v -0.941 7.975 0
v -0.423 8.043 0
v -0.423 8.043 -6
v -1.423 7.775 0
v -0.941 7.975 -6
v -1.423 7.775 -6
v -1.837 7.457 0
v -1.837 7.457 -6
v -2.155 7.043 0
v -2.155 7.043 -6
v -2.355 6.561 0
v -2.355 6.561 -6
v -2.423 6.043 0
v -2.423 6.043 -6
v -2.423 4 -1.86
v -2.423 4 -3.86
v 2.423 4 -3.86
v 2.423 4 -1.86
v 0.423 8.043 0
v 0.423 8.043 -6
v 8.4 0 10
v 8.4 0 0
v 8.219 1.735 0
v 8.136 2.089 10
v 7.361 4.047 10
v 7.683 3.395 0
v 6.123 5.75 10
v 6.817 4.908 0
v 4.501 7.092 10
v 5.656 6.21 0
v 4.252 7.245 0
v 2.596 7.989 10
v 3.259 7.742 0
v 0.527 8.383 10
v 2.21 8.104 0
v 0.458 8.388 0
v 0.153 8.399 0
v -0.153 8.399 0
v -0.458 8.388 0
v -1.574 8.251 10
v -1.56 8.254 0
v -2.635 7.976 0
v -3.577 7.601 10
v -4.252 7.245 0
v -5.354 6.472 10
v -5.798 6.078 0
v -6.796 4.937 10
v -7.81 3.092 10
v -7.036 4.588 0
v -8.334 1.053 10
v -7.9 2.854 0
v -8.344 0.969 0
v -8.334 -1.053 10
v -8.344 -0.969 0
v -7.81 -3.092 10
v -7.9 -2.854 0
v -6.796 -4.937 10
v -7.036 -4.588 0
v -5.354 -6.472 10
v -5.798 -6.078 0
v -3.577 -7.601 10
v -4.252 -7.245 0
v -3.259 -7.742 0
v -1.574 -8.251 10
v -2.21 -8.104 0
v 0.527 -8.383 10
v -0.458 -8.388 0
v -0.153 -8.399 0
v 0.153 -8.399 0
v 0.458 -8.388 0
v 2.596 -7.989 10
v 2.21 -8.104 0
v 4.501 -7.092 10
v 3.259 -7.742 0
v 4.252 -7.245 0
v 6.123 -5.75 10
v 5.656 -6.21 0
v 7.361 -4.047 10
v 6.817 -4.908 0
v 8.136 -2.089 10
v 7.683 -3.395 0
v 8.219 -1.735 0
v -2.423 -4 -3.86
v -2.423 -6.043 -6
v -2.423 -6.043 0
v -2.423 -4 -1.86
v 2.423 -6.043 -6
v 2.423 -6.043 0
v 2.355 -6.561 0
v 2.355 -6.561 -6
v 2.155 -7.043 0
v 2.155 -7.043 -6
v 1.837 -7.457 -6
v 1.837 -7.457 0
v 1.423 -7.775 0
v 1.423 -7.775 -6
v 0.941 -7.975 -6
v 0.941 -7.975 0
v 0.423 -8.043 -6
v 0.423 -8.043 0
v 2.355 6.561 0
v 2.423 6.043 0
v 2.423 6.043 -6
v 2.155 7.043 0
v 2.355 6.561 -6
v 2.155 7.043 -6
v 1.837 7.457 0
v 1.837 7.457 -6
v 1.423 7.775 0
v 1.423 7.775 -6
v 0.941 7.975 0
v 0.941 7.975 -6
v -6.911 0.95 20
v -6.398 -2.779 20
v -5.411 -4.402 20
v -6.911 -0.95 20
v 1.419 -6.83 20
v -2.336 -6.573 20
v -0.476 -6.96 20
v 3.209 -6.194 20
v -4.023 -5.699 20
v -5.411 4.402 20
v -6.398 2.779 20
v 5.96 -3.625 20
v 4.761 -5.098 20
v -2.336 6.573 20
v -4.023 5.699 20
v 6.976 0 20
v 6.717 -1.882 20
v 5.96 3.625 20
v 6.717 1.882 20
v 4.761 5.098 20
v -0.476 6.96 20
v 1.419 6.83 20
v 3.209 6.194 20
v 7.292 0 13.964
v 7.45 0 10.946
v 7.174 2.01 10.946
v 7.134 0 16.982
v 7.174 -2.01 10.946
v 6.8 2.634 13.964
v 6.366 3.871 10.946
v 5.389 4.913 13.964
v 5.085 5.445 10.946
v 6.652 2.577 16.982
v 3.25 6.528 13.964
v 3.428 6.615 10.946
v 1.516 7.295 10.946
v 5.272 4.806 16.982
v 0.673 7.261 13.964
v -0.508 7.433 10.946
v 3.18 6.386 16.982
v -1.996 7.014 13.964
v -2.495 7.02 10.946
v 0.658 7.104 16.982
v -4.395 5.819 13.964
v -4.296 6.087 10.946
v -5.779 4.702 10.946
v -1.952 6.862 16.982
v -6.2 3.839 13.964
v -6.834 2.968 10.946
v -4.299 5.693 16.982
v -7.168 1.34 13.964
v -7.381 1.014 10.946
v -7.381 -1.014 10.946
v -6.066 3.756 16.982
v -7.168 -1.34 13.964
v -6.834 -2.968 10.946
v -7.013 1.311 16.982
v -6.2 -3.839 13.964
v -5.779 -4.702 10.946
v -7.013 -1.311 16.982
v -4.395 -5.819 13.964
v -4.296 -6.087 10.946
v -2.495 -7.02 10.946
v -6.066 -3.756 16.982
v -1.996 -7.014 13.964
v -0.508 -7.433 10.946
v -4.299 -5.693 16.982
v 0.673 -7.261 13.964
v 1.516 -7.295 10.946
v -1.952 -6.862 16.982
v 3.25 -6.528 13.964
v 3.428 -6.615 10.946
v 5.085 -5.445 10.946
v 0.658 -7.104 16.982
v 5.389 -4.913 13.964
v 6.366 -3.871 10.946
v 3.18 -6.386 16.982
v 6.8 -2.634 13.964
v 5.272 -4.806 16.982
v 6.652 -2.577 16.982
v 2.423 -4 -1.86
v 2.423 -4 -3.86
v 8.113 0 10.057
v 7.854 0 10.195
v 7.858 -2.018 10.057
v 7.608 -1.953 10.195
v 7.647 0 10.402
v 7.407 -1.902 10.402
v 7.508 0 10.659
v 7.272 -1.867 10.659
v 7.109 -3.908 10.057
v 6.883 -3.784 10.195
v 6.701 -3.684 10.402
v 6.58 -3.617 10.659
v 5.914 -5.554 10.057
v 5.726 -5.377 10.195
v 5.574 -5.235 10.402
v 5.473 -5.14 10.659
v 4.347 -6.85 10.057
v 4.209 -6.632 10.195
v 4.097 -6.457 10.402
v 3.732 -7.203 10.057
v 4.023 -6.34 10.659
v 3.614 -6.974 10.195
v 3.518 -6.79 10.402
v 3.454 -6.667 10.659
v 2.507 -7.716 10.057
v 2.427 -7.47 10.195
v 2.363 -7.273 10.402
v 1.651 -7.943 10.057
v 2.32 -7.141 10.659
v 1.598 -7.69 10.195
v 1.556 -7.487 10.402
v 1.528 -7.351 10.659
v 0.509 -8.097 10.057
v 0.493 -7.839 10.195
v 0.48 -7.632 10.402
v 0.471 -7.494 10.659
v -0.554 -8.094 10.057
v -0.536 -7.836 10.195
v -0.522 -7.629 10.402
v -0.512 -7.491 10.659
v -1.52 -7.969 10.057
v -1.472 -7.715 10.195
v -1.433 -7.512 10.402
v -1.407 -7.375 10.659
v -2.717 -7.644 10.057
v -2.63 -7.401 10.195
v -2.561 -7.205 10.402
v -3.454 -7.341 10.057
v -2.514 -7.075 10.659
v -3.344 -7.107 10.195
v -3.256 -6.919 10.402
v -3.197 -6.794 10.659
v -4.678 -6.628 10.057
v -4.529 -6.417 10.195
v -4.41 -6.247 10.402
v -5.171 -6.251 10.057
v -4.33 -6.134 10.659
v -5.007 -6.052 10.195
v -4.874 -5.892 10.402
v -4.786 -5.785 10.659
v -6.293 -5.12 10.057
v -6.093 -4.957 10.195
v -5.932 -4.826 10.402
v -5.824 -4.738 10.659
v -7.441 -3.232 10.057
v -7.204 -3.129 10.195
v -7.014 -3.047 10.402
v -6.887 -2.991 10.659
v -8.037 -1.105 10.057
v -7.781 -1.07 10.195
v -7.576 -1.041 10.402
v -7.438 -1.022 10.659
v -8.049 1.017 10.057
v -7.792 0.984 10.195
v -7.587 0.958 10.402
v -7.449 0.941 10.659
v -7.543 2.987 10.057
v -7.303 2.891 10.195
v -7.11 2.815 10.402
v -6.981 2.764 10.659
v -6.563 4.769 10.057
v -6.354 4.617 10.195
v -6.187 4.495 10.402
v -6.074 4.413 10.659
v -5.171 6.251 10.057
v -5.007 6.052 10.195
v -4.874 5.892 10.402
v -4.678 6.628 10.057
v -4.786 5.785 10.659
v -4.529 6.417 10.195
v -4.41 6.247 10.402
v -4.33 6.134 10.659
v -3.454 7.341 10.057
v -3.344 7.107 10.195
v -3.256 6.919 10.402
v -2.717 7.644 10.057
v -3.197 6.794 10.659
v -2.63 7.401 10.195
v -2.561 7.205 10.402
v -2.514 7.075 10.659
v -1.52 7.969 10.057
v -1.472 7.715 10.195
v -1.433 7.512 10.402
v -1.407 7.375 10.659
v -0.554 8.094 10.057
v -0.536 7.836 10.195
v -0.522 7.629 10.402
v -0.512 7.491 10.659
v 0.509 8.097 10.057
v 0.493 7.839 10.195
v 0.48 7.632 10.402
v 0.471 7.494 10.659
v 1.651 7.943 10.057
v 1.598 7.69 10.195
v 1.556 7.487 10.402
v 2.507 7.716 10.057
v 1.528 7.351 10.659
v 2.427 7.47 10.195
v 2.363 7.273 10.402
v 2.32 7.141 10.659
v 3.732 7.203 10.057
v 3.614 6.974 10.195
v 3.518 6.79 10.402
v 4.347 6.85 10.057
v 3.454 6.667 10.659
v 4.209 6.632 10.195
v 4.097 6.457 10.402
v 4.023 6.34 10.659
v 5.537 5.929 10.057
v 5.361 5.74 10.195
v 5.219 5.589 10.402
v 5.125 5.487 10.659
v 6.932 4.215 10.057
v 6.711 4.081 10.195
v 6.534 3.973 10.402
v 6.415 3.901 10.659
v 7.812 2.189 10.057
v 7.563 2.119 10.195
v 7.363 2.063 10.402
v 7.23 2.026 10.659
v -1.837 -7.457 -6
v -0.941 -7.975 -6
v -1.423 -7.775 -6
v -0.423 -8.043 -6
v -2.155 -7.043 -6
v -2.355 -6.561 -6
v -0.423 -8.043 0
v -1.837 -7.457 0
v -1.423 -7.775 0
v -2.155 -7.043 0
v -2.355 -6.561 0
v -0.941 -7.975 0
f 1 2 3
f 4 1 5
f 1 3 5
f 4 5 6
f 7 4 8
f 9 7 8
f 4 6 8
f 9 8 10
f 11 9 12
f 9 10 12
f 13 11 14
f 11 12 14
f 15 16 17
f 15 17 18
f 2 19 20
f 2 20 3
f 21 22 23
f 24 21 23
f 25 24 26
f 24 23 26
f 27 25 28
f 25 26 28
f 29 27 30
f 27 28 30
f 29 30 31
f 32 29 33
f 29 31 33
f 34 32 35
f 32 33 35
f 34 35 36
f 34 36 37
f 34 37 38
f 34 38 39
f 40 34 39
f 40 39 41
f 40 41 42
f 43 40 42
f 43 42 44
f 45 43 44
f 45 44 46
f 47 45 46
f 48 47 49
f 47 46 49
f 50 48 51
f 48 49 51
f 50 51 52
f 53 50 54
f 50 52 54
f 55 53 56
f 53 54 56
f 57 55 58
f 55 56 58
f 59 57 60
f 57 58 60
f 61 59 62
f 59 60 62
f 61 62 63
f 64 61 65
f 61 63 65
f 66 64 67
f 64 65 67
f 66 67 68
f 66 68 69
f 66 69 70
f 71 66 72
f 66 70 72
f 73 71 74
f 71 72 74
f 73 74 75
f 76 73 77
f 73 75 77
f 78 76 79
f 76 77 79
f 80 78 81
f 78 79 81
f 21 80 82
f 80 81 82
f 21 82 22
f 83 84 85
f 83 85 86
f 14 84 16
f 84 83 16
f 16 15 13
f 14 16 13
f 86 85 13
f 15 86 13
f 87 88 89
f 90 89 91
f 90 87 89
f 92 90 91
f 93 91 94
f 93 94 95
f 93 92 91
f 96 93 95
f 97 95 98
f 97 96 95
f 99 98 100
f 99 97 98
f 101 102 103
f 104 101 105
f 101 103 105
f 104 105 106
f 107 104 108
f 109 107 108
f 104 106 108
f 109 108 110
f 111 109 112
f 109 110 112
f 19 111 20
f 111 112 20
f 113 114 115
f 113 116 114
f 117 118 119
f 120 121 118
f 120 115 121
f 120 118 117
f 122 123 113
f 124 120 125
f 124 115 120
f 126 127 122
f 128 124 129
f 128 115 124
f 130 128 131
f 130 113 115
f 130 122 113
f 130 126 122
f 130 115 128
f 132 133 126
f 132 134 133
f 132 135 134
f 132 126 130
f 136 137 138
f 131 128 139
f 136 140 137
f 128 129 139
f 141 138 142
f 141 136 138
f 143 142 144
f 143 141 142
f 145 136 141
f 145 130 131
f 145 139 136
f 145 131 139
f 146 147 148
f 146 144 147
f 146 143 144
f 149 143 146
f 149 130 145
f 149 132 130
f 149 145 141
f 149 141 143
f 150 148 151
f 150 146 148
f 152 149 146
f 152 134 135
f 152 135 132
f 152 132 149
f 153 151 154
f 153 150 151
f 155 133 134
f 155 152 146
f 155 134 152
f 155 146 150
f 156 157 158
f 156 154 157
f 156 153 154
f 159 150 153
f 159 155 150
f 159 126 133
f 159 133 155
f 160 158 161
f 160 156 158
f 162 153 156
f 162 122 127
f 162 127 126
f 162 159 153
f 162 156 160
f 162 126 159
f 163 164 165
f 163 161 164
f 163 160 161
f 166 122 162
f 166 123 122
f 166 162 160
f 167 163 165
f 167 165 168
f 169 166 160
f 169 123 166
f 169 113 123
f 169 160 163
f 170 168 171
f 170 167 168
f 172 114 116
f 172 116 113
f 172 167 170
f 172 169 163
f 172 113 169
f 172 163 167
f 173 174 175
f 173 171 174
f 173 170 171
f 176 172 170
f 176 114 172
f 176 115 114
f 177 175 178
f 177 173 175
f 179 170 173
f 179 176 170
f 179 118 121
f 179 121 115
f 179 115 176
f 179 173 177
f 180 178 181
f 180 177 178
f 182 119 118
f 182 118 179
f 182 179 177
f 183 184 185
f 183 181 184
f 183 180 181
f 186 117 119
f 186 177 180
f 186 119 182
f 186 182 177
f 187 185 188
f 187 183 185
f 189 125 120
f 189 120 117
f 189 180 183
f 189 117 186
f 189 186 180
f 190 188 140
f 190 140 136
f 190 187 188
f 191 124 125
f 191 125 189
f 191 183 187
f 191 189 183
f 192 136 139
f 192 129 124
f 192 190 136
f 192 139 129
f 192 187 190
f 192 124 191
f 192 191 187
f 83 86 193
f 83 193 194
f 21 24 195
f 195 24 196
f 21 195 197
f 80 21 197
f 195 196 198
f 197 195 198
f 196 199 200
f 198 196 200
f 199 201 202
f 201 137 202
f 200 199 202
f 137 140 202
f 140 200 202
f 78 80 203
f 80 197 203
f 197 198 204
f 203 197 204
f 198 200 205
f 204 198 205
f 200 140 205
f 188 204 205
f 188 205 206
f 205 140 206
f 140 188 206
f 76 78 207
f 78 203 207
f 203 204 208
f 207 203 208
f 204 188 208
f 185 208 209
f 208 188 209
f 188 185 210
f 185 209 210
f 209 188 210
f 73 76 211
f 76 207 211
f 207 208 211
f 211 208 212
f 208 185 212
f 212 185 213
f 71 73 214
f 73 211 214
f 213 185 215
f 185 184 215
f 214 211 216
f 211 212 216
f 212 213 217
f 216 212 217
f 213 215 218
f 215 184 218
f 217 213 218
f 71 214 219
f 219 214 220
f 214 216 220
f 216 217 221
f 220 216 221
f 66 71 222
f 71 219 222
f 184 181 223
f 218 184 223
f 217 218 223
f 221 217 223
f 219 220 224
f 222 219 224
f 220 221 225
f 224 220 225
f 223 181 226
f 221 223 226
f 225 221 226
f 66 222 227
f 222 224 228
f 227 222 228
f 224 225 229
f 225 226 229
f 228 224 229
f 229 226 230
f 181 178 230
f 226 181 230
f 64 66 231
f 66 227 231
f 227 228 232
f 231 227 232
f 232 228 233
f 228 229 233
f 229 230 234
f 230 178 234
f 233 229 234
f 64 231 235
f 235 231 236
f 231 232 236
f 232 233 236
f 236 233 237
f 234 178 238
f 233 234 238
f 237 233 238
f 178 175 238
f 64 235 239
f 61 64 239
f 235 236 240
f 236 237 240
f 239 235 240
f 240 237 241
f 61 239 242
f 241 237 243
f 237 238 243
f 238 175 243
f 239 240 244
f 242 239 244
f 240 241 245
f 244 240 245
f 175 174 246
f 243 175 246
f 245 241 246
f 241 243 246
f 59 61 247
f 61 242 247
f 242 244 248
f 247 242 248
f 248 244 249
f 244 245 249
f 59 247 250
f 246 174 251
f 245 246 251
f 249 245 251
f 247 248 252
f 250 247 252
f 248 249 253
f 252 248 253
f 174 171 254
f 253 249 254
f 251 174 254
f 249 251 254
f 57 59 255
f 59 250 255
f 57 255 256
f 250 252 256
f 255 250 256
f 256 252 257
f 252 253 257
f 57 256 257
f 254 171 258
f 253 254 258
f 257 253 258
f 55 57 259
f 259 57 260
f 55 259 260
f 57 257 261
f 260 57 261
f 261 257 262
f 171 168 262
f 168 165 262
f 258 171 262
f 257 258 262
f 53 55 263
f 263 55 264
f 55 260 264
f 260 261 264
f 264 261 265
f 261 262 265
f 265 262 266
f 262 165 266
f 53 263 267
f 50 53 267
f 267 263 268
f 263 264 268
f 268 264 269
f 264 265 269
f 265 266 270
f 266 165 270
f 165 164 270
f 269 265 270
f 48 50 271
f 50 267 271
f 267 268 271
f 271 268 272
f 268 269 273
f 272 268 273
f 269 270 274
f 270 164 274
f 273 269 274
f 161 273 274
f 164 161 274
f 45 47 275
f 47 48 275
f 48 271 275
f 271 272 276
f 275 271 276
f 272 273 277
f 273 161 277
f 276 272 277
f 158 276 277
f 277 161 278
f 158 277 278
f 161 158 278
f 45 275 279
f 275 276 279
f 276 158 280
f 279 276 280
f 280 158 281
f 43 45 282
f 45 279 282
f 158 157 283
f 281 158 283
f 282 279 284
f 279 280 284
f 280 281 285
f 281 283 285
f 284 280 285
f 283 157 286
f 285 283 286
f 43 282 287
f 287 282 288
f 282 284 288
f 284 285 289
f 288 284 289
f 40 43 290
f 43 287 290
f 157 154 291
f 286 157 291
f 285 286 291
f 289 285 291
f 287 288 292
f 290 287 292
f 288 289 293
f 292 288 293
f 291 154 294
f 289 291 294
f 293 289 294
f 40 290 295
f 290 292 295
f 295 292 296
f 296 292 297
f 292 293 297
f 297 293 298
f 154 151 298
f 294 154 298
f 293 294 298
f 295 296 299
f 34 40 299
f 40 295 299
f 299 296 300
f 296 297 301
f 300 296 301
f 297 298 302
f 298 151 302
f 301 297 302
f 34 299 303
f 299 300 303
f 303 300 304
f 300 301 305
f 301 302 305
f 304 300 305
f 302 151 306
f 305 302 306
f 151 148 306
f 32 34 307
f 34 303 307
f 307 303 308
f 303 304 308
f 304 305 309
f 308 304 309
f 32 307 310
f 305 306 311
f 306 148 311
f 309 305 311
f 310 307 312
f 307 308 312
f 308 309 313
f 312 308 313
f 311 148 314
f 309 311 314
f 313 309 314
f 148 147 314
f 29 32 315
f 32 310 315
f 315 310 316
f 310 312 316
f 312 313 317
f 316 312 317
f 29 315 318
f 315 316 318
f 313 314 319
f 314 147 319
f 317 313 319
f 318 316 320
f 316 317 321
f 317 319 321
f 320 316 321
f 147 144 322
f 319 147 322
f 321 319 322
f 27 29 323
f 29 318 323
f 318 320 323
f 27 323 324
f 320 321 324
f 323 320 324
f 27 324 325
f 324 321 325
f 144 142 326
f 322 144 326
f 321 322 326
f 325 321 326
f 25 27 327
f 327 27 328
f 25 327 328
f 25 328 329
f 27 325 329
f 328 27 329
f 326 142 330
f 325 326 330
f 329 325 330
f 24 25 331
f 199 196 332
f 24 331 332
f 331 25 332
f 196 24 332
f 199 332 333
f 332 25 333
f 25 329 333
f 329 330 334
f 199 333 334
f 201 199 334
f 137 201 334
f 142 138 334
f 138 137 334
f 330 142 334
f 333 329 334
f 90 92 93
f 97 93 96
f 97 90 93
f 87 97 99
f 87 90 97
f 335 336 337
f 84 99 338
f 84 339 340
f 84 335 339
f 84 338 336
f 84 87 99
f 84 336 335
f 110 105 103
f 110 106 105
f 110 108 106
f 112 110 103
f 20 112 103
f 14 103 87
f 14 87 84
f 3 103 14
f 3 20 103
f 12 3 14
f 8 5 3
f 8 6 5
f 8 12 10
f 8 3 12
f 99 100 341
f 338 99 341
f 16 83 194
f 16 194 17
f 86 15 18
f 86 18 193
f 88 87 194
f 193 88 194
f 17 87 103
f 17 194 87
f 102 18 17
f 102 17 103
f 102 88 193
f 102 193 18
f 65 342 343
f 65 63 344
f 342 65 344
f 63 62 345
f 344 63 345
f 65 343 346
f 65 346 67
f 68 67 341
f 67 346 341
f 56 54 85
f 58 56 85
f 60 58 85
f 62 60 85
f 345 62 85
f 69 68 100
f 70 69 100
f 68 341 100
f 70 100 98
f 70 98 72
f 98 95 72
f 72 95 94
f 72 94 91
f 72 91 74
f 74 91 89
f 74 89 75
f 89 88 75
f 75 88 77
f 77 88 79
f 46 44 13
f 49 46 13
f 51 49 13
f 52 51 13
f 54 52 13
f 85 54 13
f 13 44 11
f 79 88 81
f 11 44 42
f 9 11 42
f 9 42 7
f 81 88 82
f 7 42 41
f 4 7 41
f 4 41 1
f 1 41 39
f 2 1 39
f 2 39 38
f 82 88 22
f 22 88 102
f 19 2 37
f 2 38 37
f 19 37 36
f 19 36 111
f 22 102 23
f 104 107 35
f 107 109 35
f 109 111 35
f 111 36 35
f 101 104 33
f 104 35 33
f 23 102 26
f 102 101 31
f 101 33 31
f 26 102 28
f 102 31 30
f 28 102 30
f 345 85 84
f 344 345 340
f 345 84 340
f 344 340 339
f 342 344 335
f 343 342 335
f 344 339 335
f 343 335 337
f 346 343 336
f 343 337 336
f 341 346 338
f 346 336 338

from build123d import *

# Parameters (mm, degrees)
SKETCH_1_R          = 8.4
EXTRUDE_1_DEPTH     = 10
SKETCH_2_R          = 7.5
EXTRUDE_2_DEPTH     = 10
EXTRUDE_2_TAPER     = 3.0000000000000027
SKETCH_3_W          = 4.846227442126801
SKETCH_3_H          = 16.08583474921887
EXTRUDE_3_DEPTH     = 6
FILLET_1_R          = 2
FILLET_2_R          = 1
CUT_EXTRUDE_1_DEPTH = 25.24252038183517


with BuildPart() as part:
    # Эскиз1 → Бобышка-Вытянуть1 (new body)
    with BuildSketch(Plane.XY):
        Circle(SKETCH_1_R)
    extrude(amount=EXTRUDE_1_DEPTH)

    # Эскиз2 → Бобышка-Вытянуть2 (add)
    with BuildSketch(Plane.XY.offset(10)):
        Circle(SKETCH_2_R)
    extrude(amount=EXTRUDE_2_DEPTH, taper=EXTRUDE_2_TAPER)

    # Эскиз3 → Бобышка-Вытянуть3 (add)
    with BuildSketch(Plane(origin=(0, 0, 0), x_dir=(-1, 0, 0), z_dir=(0, 0, -1))):
        Rectangle(SKETCH_3_W, SKETCH_3_H)
    extrude(amount=EXTRUDE_3_DEPTH)

    # Скругление1
    fillet_1_edges = [part.edges().sort_by_distance(p)[0] for p in [
        (-2.4231137210634004, -8.042917374609434, -3),
        (-2.4231137210634004, 8.042917374609434, -3),
        (2.4231137210634004, 8.042917374609434, -3),
        (2.4231137210634004, -8.042917374609434, -3),
    ]]
    fillet(fillet_1_edges, radius=FILLET_1_R)

    # Скругление2
    # the kernel refuses this fillet: 1 mm, written as the material it adds along each edge
    with BuildSketch(Plane(origin=(-6.3e-16, 6.7e-16, 10), x_dir=(1, -3.3e-16, 0), z_dir=(3.3e-16, 1, 0))) as fillet_2_piece_1:
        with BuildLine():
            CenterArc((8.449027591022826, -0.9987974245654119), FILLET_2_R, 92.81020062838743, 84.18979937161257)
            Line((7.450398056268253, -0.9464614683224681), (7.430425465573162, -0.9454147491976084))
            Line((7.430425465573162, -0.9454147491976084), (7.48002740930491, 0.00104671912485976))
            Line((7.48002740930491, 0.00104671912485976), (7.500000000000001, 0.01999999999999957))
            ThreePointArc((7.500000000000001, 0.01999999999999957), (7.950000000000001, 0.01999999999999957), (8.399019448179544, 0.01997594849130735))
            Line((8.399019448179544, 0.01997594849130735), (8.4, 0))
        make_face()
    revolve(axis=Axis((-6.3e-16, 6.7e-16, 10), (0, 0, -1)))

    # Эскиз4 → Вырез-Вытянуть1 (cut, through all)
    with BuildSketch(Plane.ZY.offset(2.4231137210634004)):
        Polygon((-3.85980947138648, 3.9999999999999982), (-1.85980947138648, 3.9999999999999982), (-1.8598094713864777, -4.000000000000001), (-3.85980947138648, -4.000000000000002), align=None)
    extrude(amount=-CUT_EXTRUDE_1_DEPTH, mode=Mode.SUBTRACT)


solid = part.part
